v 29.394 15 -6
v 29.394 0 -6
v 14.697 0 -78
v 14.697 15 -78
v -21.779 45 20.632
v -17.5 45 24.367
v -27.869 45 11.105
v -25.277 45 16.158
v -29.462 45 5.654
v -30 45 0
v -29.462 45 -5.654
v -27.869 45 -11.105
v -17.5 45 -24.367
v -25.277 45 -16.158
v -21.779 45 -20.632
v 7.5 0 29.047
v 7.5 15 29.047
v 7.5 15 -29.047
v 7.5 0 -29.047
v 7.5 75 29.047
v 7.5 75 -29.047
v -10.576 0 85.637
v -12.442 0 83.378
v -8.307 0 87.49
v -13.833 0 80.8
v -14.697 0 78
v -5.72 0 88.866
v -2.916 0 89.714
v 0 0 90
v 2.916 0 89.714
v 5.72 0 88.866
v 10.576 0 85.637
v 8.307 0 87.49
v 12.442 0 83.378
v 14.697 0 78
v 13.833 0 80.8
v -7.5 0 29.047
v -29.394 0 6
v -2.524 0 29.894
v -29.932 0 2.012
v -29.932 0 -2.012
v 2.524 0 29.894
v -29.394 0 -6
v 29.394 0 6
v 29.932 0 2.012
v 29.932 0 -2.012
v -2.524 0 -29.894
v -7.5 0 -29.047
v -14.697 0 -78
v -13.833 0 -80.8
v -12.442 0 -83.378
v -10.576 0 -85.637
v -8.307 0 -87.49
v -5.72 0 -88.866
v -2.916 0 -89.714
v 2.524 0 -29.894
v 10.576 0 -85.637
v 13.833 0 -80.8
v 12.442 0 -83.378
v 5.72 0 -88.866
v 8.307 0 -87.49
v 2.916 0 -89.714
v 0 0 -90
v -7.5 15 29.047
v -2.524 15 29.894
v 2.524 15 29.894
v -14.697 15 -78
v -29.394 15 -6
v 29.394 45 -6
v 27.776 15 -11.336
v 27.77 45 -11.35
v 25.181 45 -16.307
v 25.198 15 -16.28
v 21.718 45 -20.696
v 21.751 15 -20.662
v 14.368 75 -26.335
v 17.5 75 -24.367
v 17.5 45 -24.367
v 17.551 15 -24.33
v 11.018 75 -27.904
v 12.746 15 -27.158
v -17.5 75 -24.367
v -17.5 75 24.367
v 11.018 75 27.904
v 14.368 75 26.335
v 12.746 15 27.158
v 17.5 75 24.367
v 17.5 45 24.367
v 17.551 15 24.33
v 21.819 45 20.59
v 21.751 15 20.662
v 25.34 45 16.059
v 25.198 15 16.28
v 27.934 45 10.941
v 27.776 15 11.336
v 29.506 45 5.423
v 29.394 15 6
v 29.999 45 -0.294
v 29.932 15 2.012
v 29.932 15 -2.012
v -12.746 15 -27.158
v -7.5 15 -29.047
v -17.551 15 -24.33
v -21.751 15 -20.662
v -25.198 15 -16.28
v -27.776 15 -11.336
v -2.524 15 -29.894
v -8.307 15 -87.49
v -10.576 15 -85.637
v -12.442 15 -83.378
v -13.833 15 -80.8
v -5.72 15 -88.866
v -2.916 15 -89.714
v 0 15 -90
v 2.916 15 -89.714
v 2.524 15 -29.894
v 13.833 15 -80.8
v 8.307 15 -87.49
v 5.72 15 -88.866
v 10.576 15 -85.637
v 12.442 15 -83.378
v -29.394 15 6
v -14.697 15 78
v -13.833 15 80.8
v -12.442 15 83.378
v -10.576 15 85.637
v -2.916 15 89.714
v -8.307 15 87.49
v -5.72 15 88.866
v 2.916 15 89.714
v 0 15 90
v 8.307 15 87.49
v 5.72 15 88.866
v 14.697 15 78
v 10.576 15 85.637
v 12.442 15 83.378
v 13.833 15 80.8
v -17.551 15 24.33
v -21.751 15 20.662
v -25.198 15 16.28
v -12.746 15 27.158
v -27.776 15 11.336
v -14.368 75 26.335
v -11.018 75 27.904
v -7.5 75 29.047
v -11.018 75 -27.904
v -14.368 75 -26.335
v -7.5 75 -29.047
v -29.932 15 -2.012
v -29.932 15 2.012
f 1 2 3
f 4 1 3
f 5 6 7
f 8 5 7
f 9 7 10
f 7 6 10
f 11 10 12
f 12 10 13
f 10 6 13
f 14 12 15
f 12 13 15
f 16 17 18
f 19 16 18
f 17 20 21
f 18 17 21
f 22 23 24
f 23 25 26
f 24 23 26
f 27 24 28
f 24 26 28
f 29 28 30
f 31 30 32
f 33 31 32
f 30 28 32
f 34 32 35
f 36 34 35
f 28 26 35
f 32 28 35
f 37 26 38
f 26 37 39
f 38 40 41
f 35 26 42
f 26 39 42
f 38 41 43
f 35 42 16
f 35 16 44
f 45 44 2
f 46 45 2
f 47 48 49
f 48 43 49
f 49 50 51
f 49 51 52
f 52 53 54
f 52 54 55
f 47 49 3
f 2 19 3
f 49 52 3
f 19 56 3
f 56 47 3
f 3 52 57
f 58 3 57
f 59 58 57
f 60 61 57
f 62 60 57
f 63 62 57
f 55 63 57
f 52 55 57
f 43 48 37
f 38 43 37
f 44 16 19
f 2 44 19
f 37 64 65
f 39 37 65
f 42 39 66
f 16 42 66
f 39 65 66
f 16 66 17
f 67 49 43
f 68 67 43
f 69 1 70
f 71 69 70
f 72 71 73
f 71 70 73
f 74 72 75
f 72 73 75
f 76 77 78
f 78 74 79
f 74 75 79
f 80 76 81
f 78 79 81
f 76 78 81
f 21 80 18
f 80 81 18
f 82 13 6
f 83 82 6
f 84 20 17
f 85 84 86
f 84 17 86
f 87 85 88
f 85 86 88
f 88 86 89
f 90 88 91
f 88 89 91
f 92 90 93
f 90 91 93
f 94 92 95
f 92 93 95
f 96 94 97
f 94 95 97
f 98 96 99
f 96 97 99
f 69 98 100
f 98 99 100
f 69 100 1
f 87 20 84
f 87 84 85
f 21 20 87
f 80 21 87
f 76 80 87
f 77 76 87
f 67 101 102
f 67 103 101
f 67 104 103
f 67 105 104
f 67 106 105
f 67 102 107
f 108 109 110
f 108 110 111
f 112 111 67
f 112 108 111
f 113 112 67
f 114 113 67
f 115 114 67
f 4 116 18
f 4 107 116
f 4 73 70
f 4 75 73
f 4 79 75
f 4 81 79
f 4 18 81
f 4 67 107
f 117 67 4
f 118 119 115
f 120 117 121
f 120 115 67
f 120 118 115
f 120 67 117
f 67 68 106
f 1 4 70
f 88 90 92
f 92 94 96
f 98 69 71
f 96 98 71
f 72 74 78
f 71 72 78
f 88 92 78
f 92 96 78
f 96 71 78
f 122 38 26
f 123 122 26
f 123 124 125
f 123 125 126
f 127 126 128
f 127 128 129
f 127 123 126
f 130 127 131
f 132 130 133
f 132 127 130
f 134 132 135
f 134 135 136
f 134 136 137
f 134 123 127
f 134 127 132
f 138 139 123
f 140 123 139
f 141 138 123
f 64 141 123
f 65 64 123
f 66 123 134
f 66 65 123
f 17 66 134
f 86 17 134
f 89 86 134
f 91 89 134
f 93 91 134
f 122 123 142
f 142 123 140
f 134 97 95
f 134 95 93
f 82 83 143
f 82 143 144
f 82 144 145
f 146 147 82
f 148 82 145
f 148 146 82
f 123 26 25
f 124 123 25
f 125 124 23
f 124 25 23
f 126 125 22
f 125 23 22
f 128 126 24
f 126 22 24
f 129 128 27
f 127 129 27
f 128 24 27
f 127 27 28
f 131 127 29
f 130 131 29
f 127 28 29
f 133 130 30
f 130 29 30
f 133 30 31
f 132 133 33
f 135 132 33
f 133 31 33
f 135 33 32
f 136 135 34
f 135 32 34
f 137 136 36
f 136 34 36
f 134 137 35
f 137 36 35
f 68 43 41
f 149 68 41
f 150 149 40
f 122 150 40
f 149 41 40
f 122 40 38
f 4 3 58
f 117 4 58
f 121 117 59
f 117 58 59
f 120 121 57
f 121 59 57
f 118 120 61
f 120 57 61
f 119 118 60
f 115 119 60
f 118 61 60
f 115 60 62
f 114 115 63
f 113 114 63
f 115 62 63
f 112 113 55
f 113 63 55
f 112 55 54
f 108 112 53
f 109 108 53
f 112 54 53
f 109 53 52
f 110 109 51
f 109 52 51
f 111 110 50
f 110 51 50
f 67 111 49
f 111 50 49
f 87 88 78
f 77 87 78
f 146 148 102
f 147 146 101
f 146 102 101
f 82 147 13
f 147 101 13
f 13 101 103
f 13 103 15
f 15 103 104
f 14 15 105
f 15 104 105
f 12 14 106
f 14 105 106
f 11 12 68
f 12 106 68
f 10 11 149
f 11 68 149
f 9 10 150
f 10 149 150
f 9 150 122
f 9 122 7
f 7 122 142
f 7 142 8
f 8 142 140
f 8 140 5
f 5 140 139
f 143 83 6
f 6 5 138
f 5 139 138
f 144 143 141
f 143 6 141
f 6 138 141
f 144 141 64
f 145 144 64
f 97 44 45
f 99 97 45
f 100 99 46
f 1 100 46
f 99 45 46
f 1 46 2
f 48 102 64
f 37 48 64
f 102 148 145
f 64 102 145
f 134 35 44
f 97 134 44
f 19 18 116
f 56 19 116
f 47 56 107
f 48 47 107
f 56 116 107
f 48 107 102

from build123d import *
from build123d.topology import SkipClean

# Parameters (mm, degrees)
BOSS_EXTRUDE1_DEPTH = 15
SKETCH2_R           = 30
BOSS_EXTRUDE2_DEPTH = 60
CUT_EXTRUDE1_DEPTH  = 121.933866224
CUT_EXTRUDE2_START  = -30
CUT_EXTRUDE2_DEPTH  = 30


with BuildPart() as part:
    # Sketch1 → Boss-Extrude1 (new body)
    with BuildSketch(Plane(origin=(0, 0, 0), x_dir=(1, 0, 0), z_dir=(0, 1, 0))):
        with BuildLine():
            Line((-14.696938457, 78), (-29.393876913, 6))
            ThreePointArc((-29.393876913, 6), (-30, 0), (-29.393876913, -6))
            Line((-29.393876913, -6), (-14.696938457, -78))
            ThreePointArc((-14.696938457, -78), (0, -90), (14.696938457, -78))
            Line((14.696938457, -78), (29.393876913, -6))
            ThreePointArc((29.393876913, -6), (30, 0), (29.393876913, 6))
            Line((29.393876913, 6), (14.696938457, 78))
            ThreePointArc((14.696938457, 78), (0, 90), (-14.696938457, 78))
        make_face()
    extrude(amount=BOSS_EXTRUDE1_DEPTH)

    # Sketch2 → Boss-Extrude2 (add)
    with BuildSketch(Plane(origin=(0, 15, 0), x_dir=(1, 0, 0), z_dir=(0, 1, 0))):
        with Locations(Location((0, 0, 0), (0, 0, 11.536959033))):
            Circle(SKETCH2_R)
    extrude(amount=BOSS_EXTRUDE2_DEPTH)

    # Sketch3 → Cut-Extrude1 (cut, through all)
    with SkipClean():  # the faces are left unmerged after this step: merging them gives an invalid solid
        with BuildSketch(Plane(origin=(0, 75, 0), x_dir=(1, 0, 0), z_dir=(0, 1, 0))):
            with BuildLine():
                Line((-7.5, 29.047375097), (-7.5, -29.047375097))
                ThreePointArc((-7.5, -29.047375097), (0, -30), (7.5, -29.047375097))
                Line((7.5, -29.047375097), (7.5, 29.047375097))
                ThreePointArc((7.5, 29.047375097), (0, 30), (-7.5, 29.047375097))
            make_face()
        extrude(amount=-CUT_EXTRUDE1_DEPTH, mode=Mode.SUBTRACT)

    # Sketch4 → Cut-Extrude2 (cut)
    with SkipClean():  # the faces are left unmerged after this step: merging them gives an invalid solid
        with BuildSketch(Plane(origin=(0, 75, 0), x_dir=(1, 0, 0), z_dir=(0, 1, 0)).offset(CUT_EXTRUDE2_START)):
            with BuildLine():
                Line((-17.5, 24.366985862), (-17.5, -24.366985862))
                ThreePointArc((-17.5, -24.366985862), (-30, 0), (-17.5, 24.366985862))
            make_face()
            with BuildLine():
                Line((17.5, -24.366985862), (17.5, 24.366985862))
                ThreePointArc((17.5, 24.366985862), (30, 0), (17.5, -24.366985862))
            make_face()
        extrude(amount=CUT_EXTRUDE2_DEPTH, mode=Mode.SUBTRACT)


solid = part.part
